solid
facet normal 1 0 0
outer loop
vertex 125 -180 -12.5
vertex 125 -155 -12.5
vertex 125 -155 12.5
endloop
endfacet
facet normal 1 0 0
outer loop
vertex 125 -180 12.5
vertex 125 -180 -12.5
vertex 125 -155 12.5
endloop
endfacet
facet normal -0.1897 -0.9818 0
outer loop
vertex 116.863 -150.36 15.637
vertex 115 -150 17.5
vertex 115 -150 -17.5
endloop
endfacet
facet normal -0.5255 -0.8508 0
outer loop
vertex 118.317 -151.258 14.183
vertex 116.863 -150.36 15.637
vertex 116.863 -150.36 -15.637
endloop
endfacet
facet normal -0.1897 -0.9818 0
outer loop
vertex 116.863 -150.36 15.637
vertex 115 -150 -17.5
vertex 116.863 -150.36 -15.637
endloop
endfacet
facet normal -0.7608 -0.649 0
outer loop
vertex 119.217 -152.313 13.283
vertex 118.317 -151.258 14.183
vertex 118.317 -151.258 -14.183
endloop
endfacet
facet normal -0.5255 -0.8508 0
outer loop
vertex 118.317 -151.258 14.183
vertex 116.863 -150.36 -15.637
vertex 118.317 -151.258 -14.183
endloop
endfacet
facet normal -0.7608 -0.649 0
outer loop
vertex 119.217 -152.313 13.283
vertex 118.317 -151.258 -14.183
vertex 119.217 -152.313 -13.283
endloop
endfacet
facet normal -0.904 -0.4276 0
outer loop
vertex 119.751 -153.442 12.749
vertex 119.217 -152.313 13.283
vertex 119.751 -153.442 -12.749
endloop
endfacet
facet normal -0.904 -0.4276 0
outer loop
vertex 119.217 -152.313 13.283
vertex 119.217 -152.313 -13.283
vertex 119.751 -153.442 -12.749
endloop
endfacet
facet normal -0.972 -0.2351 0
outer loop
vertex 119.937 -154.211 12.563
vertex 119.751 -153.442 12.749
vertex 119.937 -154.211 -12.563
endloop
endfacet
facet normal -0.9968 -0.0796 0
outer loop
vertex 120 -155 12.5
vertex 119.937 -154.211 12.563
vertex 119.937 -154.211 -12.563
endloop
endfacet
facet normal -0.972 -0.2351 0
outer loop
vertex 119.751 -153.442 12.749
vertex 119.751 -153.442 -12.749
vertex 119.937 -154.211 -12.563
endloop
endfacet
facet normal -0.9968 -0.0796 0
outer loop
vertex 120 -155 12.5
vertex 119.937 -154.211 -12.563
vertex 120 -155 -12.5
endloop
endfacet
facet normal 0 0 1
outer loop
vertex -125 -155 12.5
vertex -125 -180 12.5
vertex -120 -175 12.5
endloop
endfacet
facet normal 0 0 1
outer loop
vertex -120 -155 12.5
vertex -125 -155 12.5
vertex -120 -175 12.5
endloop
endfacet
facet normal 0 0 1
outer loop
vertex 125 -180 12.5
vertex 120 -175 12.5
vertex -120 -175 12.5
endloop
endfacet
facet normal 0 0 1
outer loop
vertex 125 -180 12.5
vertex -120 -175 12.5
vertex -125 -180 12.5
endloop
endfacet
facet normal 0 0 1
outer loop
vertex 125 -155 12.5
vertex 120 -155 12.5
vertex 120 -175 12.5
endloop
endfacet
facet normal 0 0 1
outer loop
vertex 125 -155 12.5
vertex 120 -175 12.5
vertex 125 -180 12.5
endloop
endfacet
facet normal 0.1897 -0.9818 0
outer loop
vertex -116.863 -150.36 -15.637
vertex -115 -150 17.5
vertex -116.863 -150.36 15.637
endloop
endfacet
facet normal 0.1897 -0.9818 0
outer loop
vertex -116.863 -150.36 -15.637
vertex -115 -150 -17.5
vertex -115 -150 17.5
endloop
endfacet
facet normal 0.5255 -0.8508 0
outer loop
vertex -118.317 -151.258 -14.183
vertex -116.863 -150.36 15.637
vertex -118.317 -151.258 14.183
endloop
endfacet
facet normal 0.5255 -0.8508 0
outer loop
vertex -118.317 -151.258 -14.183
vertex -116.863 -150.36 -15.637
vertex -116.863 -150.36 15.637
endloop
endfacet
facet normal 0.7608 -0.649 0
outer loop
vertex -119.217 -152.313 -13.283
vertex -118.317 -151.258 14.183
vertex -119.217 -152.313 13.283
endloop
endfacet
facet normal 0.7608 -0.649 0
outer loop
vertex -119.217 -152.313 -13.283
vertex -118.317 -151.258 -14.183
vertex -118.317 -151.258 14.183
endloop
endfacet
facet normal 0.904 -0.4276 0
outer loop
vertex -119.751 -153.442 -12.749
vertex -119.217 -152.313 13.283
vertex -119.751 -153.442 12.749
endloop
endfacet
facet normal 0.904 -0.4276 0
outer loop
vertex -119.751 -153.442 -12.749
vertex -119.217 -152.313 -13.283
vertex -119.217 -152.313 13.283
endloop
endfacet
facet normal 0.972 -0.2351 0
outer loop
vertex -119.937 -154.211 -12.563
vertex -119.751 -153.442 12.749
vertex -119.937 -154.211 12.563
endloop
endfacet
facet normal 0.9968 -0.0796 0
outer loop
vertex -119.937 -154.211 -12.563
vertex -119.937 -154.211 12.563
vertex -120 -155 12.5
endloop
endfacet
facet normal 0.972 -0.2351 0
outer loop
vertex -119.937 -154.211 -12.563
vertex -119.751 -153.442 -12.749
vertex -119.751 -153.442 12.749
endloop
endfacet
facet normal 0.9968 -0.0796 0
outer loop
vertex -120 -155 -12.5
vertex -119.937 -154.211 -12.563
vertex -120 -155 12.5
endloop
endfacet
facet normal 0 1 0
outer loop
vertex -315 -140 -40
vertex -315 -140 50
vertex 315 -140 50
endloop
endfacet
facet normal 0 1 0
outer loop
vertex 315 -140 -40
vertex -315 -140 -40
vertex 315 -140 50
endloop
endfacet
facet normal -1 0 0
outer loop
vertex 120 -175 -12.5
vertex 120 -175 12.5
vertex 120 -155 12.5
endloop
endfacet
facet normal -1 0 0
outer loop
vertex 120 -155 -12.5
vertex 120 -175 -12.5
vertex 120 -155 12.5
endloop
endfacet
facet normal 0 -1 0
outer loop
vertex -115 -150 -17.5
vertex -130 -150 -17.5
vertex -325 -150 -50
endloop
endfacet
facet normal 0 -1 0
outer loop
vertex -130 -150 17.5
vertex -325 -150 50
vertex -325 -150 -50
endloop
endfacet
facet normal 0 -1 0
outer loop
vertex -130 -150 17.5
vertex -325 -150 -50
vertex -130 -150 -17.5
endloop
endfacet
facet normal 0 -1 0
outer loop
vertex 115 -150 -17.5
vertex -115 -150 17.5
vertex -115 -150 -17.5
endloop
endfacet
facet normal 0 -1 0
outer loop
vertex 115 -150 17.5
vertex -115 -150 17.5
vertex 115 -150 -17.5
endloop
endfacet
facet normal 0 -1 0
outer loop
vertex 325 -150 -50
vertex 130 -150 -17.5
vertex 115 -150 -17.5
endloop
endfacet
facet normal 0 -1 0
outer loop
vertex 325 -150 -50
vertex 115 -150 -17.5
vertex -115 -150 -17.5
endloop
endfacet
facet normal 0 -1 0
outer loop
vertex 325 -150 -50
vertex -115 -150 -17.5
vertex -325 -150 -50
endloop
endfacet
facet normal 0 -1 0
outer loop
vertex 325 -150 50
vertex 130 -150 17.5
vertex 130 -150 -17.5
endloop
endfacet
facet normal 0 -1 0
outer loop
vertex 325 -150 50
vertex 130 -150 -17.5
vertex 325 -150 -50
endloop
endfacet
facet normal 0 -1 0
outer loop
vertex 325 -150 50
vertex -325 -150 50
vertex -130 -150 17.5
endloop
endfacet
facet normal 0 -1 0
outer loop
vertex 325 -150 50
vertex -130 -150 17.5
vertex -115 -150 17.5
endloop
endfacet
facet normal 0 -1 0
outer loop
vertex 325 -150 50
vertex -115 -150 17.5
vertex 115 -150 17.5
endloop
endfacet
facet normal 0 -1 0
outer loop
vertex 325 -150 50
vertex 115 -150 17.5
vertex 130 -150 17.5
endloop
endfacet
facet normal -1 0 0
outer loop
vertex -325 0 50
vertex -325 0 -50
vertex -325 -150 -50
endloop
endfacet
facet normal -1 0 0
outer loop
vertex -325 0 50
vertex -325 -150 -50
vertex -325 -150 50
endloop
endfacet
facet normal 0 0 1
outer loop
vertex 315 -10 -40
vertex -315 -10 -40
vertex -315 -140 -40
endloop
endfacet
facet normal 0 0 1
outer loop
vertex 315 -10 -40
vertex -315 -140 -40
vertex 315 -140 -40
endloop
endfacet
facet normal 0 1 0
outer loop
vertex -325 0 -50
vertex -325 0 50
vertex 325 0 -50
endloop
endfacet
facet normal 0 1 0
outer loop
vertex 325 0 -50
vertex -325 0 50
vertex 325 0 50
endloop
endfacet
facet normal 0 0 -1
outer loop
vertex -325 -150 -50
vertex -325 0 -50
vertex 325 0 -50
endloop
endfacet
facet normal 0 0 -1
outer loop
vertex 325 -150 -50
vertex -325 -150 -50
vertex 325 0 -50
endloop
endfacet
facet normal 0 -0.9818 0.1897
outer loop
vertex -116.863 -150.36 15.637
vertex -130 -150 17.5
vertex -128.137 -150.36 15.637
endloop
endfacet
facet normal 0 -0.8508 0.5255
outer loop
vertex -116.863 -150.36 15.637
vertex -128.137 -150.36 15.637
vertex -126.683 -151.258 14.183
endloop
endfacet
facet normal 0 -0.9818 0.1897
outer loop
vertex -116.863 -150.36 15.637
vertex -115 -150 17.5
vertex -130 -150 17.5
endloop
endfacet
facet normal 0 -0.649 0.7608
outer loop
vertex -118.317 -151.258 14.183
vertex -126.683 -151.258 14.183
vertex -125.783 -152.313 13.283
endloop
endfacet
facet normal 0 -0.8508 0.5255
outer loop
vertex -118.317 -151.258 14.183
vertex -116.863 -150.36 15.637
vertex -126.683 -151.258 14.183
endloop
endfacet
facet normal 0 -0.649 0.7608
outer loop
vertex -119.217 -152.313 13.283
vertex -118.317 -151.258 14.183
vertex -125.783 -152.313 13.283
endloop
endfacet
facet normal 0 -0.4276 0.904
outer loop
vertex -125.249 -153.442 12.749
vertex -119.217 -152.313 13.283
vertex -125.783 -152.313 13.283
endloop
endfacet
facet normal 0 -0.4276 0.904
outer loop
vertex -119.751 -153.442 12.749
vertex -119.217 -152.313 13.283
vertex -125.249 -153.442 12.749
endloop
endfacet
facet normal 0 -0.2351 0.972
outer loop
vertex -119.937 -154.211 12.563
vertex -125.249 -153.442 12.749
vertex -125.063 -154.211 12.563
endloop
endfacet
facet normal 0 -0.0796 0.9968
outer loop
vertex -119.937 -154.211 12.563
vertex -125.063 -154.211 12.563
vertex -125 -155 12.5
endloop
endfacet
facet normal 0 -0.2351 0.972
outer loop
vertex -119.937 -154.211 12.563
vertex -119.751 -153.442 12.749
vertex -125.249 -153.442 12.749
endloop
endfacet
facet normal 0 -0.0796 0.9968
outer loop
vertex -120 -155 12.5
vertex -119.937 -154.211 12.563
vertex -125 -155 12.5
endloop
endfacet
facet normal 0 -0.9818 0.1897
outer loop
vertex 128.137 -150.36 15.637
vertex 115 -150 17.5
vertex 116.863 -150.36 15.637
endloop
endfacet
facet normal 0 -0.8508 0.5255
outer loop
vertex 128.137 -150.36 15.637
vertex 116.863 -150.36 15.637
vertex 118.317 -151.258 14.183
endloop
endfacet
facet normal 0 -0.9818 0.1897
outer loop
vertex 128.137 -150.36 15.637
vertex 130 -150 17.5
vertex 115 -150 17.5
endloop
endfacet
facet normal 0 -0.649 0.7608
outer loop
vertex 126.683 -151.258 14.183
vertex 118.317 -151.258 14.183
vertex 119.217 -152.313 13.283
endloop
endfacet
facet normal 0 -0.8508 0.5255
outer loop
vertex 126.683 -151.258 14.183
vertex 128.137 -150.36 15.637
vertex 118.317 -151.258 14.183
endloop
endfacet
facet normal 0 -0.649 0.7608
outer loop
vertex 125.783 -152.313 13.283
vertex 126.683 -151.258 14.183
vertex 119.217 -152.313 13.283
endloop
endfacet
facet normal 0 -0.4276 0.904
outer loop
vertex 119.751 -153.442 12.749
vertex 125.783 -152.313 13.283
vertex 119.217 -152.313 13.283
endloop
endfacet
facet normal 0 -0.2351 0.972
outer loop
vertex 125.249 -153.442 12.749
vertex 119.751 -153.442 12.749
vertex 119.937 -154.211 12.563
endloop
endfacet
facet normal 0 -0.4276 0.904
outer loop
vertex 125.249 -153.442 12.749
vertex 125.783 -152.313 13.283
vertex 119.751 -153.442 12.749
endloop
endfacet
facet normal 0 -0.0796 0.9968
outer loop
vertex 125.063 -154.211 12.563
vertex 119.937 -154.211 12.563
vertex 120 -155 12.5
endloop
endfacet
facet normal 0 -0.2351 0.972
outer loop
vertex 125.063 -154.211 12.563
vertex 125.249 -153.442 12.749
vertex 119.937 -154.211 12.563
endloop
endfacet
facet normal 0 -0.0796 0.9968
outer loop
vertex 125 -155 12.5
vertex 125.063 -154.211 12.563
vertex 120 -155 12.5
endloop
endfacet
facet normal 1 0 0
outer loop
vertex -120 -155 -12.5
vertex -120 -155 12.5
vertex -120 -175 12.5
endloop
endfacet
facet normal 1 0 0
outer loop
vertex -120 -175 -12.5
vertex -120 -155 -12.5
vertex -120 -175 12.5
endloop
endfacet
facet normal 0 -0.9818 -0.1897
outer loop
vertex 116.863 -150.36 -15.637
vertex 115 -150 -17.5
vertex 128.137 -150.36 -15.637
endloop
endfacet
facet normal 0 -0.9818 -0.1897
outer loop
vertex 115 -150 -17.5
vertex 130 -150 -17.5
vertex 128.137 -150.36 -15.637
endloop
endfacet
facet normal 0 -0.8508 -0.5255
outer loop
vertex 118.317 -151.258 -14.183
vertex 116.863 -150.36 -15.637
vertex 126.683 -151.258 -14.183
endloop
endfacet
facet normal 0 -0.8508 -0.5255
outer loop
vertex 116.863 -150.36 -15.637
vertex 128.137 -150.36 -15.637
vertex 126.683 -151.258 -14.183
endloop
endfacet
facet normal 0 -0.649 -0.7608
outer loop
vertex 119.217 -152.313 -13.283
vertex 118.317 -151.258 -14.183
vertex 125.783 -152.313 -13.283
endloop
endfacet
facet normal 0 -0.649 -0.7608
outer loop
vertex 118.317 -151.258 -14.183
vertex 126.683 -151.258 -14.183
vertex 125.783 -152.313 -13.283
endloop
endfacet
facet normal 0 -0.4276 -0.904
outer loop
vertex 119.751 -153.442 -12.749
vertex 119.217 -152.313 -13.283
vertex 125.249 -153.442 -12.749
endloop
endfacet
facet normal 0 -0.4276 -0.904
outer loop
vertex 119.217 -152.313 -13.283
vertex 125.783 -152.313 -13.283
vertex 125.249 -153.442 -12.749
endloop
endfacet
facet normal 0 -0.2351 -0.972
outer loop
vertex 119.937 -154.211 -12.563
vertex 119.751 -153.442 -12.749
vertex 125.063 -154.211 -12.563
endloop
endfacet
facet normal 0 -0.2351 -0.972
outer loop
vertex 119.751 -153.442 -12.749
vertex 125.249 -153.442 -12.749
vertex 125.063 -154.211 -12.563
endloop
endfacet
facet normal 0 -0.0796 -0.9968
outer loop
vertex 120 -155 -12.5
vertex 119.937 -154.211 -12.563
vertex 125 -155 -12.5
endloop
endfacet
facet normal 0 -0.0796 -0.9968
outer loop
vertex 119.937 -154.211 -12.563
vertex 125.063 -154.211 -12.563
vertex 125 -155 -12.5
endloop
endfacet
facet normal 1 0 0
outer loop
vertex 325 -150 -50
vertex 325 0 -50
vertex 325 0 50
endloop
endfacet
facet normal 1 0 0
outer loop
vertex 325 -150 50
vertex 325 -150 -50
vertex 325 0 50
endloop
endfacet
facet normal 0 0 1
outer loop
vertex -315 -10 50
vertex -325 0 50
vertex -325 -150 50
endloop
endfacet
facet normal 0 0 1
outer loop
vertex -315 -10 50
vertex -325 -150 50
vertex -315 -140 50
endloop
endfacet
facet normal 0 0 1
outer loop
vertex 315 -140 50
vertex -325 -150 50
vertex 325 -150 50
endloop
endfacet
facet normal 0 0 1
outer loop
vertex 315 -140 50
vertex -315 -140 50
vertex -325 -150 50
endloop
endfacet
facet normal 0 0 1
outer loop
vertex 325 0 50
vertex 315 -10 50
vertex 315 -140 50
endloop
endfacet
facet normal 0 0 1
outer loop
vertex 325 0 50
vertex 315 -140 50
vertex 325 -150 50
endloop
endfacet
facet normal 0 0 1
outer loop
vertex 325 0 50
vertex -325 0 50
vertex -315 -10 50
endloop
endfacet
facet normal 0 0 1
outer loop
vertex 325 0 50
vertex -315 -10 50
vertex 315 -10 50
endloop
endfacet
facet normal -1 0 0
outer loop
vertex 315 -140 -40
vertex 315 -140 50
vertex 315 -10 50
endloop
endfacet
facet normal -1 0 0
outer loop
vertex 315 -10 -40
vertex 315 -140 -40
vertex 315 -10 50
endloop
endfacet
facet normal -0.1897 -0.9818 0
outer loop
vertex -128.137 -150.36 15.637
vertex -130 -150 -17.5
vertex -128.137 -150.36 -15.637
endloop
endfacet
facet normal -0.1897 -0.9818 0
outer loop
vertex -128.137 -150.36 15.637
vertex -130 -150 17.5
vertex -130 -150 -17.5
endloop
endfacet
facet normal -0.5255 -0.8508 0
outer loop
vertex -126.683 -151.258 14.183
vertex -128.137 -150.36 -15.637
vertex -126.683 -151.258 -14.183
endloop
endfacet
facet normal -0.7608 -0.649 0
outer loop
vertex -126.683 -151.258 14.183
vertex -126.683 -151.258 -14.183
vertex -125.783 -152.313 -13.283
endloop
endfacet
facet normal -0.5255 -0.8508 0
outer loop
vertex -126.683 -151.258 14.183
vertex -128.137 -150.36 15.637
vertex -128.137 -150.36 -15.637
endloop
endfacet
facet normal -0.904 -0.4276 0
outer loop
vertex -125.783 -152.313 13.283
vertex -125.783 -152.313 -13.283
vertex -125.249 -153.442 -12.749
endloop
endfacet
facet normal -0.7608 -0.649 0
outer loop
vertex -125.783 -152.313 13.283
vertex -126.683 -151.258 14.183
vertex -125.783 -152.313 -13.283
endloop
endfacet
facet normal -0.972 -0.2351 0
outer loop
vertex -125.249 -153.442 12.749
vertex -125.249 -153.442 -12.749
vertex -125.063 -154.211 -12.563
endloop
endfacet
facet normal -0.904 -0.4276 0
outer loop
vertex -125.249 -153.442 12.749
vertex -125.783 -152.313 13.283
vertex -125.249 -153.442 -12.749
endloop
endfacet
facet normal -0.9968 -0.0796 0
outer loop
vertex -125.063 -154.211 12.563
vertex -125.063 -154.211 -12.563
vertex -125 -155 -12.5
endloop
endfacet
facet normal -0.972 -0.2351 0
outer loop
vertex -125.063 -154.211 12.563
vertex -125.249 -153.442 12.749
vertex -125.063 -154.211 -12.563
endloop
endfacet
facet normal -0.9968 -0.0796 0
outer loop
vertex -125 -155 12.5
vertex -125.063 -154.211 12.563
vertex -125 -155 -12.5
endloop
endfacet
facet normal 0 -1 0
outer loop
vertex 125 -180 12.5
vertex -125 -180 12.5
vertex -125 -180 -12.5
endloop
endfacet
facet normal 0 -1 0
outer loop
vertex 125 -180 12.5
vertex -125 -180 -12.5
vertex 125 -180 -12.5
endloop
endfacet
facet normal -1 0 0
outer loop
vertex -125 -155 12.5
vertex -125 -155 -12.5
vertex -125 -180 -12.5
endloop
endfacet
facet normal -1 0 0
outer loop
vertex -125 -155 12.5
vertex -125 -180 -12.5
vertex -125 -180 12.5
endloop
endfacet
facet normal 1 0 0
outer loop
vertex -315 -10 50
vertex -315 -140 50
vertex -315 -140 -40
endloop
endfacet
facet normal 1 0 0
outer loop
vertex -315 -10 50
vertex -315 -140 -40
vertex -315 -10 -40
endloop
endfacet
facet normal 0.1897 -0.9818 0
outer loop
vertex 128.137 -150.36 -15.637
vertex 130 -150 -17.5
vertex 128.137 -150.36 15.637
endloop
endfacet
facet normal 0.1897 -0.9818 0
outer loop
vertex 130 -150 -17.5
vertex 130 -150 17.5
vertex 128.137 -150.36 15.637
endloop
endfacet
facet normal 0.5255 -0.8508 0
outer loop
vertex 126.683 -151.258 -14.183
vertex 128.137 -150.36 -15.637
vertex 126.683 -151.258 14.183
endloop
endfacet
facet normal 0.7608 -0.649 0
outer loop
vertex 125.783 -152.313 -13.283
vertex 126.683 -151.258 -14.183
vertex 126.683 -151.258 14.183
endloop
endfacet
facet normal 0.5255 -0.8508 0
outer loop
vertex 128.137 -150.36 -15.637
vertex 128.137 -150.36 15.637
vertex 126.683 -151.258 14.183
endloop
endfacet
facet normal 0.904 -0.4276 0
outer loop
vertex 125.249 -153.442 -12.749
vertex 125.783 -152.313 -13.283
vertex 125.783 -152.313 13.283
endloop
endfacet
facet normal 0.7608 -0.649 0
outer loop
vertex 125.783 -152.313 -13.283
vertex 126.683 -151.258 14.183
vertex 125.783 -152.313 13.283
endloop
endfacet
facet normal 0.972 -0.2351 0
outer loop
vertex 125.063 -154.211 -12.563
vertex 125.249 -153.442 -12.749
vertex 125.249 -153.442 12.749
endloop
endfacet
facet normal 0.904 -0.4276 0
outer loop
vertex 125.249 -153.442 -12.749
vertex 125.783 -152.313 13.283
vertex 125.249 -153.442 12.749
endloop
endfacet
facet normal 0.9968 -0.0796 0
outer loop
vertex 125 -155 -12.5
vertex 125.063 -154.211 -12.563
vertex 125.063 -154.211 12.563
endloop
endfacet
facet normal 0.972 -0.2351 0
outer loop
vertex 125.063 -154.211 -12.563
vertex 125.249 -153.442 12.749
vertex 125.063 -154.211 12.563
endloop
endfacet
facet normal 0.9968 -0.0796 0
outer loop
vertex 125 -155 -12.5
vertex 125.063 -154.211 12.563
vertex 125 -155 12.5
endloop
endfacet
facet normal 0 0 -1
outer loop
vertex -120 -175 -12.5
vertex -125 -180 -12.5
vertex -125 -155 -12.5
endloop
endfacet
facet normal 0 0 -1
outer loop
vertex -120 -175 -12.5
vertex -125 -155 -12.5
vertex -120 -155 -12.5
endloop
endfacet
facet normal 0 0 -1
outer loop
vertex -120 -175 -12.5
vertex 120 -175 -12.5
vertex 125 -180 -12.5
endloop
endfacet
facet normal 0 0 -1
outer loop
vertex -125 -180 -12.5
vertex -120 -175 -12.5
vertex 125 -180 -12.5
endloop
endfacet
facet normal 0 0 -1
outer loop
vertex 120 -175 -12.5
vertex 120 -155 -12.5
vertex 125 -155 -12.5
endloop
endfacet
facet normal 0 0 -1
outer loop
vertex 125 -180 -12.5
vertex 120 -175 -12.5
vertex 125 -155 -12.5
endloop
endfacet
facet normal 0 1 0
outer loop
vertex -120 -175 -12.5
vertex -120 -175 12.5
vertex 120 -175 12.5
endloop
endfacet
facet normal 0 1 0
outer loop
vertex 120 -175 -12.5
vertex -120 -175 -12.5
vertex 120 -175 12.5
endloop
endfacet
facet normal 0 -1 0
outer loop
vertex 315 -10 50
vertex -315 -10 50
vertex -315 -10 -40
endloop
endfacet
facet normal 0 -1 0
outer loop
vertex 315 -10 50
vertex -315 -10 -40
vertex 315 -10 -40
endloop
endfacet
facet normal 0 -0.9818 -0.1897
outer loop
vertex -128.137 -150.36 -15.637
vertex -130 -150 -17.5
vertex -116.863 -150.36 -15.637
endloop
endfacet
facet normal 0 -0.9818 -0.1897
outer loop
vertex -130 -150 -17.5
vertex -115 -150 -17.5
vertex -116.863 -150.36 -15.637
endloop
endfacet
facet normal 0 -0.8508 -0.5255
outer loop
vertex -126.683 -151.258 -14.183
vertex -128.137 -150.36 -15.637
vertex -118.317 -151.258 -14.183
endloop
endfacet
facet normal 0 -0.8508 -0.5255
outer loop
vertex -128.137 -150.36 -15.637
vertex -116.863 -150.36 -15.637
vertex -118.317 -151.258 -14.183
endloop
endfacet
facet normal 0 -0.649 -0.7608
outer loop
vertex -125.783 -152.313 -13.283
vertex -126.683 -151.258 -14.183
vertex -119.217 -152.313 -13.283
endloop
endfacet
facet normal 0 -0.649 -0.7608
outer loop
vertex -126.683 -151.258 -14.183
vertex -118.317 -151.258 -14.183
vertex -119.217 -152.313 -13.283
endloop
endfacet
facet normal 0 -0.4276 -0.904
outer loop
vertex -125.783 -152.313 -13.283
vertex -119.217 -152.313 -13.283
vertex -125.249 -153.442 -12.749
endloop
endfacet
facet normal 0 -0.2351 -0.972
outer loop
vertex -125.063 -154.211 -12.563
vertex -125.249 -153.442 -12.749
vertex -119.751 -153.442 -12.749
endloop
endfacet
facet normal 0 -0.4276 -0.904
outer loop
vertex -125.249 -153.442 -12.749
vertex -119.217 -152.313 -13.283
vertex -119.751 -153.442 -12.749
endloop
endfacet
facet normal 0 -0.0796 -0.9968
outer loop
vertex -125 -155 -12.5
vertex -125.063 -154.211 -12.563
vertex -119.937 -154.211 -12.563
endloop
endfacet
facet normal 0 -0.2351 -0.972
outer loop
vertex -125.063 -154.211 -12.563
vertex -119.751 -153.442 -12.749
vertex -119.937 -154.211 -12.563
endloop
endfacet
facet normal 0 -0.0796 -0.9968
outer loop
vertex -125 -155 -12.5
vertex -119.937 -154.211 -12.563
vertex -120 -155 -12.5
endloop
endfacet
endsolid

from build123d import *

# Parameters (mm, degrees)
F0_W     = 650
F0_H     = 100
F1_DEPTH = 150
F2_W     = 250
F2_H     = 25
F3_DEPTH = 30
F5_DEPTH = 25
F6_R     = 5
F7_W     = 630
F7_H     = 130
F8_DEPTH = 90


with BuildPart() as f1:
    # F0 (on Front) → F1 (new body)
    with BuildSketch(Plane.XZ):
        Rectangle(F0_W, F0_H)
    extrude(amount=F1_DEPTH)

    # F2 (on face) → F3 (join)
    with BuildSketch(Plane.XZ.offset(150)):
        Rectangle(F2_W, F2_H)
    extrude(amount=F3_DEPTH)

    # F4 (on face) → F5 (cut)
    with BuildSketch(Plane.XY.offset(12.5)):
        Polygon((-120, -175), (120, -175), (120, -155), (120, -150), (-120, -150), (-120, -155), align=None)
    extrude(amount=-F5_DEPTH, mode=Mode.SUBTRACT)

    # F6
    f6_edges = [f1.edges().sort_by_distance(p)[0] for p in [
        (125, -150, 0),
        (-125, -150, 0),
        (-122.5, -150, 12.5),
        (-122.5, -150, -12.5),
        (-120, -150, 0),
        (120, -150, 0),
        (122.5, -150, -12.5),
        (122.5, -150, 12.5),
    ]]
    fillet(f6_edges, radius=F6_R)

    # F7 (on face) → F8 (cut)
    with BuildSketch(Plane.XY.offset(50)):
        with Locations((0, -75)):
            Rectangle(F7_W, F7_H)
    extrude(amount=-F8_DEPTH, mode=Mode.SUBTRACT)


solid = f1.part
